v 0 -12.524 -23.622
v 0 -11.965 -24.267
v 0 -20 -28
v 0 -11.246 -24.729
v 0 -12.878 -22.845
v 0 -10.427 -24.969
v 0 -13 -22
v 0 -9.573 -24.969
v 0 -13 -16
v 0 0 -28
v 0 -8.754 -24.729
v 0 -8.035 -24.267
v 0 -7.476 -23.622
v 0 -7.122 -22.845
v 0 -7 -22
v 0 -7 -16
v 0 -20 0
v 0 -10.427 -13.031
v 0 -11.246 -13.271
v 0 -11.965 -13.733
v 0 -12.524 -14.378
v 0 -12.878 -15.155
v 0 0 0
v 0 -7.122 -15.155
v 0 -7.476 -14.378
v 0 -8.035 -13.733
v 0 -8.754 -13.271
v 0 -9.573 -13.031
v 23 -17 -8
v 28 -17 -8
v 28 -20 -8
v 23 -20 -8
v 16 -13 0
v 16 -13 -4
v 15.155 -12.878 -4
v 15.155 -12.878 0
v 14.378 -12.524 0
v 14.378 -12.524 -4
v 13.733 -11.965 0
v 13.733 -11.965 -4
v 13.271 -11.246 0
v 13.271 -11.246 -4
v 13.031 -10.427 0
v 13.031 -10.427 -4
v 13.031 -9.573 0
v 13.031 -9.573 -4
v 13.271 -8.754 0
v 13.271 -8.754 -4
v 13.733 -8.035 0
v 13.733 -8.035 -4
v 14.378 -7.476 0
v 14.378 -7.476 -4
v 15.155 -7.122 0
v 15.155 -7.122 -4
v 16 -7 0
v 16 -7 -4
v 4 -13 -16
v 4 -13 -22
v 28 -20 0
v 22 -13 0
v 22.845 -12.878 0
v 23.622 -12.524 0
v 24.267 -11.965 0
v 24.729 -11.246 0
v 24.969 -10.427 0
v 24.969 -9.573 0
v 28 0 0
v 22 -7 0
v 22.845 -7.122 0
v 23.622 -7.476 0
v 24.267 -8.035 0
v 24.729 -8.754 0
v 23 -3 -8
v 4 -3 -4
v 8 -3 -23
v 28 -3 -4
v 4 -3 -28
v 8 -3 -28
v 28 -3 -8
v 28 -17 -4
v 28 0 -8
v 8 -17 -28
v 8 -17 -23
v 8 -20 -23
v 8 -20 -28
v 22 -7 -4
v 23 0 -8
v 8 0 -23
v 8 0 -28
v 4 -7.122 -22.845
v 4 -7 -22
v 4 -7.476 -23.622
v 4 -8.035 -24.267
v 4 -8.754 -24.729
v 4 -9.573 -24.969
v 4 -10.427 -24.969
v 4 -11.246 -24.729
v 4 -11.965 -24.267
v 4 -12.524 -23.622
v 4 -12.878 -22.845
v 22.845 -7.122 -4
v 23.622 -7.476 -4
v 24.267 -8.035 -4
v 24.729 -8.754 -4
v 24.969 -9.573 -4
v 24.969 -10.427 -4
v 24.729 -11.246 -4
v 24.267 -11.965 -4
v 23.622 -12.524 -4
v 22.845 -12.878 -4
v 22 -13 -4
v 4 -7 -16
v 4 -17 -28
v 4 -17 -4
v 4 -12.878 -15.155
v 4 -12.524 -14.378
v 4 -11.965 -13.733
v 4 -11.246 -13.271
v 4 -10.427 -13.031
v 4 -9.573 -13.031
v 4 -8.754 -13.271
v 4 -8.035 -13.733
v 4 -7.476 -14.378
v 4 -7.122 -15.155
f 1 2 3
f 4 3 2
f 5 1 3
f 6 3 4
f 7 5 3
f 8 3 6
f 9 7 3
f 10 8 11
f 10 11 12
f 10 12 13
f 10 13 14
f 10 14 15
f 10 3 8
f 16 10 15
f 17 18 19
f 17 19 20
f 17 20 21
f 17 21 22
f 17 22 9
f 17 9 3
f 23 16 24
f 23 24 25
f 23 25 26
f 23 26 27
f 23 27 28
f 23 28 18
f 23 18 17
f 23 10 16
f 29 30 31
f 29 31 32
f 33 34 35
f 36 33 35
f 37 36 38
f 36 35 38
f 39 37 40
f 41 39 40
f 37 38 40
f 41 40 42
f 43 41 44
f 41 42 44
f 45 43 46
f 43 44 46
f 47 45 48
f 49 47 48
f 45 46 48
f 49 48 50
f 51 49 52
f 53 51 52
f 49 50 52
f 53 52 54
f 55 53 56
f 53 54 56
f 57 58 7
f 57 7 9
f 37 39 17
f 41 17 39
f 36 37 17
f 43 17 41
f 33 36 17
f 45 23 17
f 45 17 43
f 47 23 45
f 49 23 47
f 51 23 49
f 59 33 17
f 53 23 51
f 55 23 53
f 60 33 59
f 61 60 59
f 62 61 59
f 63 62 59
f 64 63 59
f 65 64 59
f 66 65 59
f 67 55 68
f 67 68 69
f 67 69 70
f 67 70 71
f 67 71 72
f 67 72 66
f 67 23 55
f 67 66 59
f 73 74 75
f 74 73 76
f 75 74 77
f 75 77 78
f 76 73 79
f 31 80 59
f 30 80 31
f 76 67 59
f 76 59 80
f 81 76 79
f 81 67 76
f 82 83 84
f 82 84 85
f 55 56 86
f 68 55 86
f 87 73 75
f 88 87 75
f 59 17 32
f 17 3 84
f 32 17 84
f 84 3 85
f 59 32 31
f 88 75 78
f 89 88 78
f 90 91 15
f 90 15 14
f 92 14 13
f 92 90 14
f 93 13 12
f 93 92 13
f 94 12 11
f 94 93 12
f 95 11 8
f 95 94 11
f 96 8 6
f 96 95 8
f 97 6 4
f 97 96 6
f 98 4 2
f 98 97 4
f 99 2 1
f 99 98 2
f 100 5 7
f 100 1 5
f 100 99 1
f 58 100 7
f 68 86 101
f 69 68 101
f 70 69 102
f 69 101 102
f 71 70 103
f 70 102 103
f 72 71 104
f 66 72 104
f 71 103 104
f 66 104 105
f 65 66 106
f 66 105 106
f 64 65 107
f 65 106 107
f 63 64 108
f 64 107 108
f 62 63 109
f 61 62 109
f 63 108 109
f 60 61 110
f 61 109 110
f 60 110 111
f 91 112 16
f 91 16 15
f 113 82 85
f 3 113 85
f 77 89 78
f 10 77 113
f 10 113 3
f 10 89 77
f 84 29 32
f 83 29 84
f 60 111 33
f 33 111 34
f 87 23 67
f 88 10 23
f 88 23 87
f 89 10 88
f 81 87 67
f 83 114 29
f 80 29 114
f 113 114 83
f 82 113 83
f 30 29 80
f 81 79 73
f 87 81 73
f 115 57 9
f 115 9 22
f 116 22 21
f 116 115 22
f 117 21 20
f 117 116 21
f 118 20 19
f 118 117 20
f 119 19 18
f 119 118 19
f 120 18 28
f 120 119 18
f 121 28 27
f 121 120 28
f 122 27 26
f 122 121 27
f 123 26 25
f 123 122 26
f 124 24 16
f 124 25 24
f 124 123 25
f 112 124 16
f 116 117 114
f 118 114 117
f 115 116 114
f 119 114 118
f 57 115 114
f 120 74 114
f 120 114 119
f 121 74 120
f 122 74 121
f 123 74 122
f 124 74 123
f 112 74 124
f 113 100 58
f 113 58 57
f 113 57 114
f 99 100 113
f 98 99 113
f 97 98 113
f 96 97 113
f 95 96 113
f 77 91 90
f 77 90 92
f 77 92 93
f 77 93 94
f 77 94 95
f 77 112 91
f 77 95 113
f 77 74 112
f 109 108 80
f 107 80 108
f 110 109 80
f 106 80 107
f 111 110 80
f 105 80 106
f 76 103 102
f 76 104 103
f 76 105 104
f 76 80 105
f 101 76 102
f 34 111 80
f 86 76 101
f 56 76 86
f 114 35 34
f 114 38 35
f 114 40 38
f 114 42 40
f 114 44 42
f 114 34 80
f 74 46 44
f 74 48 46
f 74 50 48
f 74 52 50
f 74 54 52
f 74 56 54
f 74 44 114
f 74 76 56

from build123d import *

# Parameters (mm, degrees)
EXTRUDE_1_DEPTH     = 20
RIB_START           = -3
RIB_1_DEPTH         = 3
CUT_EXTRUDE_1_DEPTH = 42.952353927


# Read off the part's stored shape, not the designer's step: 筋1
with BuildPart() as part:
    # 草图1 → 拉伸-薄壁1 (new body)
    with BuildSketch(Plane(origin=(0, 0, 0), x_dir=(1, 0, 0), z_dir=(0, 1, 0))):
        Polygon((0, 28), (0, 0), (28, 0), (28, 4), (4, 4), (4, 28), align=None)
    extrude(amount=-EXTRUDE_1_DEPTH)

    # 筋1 outline → 筋1 (add)
    with BuildSketch(Plane(origin=(0, 0, 0), x_dir=(1, 0, 0), z_dir=(0, 1, 0)).offset(RIB_START)):
        Polygon((8, 28), (4, 28), (4, 4), (28, 4), (28, 8), (23, 8), (8, 23), align=None)
    rib_1 = extrude(amount=RIB_1_DEPTH)

    # 镜向1: 筋1 across plane
    add(rib_1.mirror(Plane(origin=(0, -10, 0), x_dir=(0, 0, 1), z_dir=(0, -1, 0))))

    # 草图3 → 切除-拉伸1 (cut, through all)
    with BuildSketch(Plane(origin=(4, 0, 0), x_dir=(0, 0, -1), z_dir=(1, 0, 0))):
        with BuildLine():
            Line((22, -13), (16, -13))
            ThreePointArc((16, -13), (13, -10), (16, -7))
            Line((16, -7), (22, -7))
            ThreePointArc((22, -7), (25, -10), (22, -13))
        make_face()
    cut_extrude_1 = extrude(amount=-CUT_EXTRUDE_1_DEPTH, mode=Mode.SUBTRACT)

    # 镜向2: 切除-拉伸1 across plane
    add(cut_extrude_1.mirror(Plane(origin=(0, 0, 0), x_dir=(-0.7071067811865478, 0, 0.7071067811865472), z_dir=(0.7071067811865475, 0, 0.7071067811865477))), mode=Mode.SUBTRACT)


solid = part.part
